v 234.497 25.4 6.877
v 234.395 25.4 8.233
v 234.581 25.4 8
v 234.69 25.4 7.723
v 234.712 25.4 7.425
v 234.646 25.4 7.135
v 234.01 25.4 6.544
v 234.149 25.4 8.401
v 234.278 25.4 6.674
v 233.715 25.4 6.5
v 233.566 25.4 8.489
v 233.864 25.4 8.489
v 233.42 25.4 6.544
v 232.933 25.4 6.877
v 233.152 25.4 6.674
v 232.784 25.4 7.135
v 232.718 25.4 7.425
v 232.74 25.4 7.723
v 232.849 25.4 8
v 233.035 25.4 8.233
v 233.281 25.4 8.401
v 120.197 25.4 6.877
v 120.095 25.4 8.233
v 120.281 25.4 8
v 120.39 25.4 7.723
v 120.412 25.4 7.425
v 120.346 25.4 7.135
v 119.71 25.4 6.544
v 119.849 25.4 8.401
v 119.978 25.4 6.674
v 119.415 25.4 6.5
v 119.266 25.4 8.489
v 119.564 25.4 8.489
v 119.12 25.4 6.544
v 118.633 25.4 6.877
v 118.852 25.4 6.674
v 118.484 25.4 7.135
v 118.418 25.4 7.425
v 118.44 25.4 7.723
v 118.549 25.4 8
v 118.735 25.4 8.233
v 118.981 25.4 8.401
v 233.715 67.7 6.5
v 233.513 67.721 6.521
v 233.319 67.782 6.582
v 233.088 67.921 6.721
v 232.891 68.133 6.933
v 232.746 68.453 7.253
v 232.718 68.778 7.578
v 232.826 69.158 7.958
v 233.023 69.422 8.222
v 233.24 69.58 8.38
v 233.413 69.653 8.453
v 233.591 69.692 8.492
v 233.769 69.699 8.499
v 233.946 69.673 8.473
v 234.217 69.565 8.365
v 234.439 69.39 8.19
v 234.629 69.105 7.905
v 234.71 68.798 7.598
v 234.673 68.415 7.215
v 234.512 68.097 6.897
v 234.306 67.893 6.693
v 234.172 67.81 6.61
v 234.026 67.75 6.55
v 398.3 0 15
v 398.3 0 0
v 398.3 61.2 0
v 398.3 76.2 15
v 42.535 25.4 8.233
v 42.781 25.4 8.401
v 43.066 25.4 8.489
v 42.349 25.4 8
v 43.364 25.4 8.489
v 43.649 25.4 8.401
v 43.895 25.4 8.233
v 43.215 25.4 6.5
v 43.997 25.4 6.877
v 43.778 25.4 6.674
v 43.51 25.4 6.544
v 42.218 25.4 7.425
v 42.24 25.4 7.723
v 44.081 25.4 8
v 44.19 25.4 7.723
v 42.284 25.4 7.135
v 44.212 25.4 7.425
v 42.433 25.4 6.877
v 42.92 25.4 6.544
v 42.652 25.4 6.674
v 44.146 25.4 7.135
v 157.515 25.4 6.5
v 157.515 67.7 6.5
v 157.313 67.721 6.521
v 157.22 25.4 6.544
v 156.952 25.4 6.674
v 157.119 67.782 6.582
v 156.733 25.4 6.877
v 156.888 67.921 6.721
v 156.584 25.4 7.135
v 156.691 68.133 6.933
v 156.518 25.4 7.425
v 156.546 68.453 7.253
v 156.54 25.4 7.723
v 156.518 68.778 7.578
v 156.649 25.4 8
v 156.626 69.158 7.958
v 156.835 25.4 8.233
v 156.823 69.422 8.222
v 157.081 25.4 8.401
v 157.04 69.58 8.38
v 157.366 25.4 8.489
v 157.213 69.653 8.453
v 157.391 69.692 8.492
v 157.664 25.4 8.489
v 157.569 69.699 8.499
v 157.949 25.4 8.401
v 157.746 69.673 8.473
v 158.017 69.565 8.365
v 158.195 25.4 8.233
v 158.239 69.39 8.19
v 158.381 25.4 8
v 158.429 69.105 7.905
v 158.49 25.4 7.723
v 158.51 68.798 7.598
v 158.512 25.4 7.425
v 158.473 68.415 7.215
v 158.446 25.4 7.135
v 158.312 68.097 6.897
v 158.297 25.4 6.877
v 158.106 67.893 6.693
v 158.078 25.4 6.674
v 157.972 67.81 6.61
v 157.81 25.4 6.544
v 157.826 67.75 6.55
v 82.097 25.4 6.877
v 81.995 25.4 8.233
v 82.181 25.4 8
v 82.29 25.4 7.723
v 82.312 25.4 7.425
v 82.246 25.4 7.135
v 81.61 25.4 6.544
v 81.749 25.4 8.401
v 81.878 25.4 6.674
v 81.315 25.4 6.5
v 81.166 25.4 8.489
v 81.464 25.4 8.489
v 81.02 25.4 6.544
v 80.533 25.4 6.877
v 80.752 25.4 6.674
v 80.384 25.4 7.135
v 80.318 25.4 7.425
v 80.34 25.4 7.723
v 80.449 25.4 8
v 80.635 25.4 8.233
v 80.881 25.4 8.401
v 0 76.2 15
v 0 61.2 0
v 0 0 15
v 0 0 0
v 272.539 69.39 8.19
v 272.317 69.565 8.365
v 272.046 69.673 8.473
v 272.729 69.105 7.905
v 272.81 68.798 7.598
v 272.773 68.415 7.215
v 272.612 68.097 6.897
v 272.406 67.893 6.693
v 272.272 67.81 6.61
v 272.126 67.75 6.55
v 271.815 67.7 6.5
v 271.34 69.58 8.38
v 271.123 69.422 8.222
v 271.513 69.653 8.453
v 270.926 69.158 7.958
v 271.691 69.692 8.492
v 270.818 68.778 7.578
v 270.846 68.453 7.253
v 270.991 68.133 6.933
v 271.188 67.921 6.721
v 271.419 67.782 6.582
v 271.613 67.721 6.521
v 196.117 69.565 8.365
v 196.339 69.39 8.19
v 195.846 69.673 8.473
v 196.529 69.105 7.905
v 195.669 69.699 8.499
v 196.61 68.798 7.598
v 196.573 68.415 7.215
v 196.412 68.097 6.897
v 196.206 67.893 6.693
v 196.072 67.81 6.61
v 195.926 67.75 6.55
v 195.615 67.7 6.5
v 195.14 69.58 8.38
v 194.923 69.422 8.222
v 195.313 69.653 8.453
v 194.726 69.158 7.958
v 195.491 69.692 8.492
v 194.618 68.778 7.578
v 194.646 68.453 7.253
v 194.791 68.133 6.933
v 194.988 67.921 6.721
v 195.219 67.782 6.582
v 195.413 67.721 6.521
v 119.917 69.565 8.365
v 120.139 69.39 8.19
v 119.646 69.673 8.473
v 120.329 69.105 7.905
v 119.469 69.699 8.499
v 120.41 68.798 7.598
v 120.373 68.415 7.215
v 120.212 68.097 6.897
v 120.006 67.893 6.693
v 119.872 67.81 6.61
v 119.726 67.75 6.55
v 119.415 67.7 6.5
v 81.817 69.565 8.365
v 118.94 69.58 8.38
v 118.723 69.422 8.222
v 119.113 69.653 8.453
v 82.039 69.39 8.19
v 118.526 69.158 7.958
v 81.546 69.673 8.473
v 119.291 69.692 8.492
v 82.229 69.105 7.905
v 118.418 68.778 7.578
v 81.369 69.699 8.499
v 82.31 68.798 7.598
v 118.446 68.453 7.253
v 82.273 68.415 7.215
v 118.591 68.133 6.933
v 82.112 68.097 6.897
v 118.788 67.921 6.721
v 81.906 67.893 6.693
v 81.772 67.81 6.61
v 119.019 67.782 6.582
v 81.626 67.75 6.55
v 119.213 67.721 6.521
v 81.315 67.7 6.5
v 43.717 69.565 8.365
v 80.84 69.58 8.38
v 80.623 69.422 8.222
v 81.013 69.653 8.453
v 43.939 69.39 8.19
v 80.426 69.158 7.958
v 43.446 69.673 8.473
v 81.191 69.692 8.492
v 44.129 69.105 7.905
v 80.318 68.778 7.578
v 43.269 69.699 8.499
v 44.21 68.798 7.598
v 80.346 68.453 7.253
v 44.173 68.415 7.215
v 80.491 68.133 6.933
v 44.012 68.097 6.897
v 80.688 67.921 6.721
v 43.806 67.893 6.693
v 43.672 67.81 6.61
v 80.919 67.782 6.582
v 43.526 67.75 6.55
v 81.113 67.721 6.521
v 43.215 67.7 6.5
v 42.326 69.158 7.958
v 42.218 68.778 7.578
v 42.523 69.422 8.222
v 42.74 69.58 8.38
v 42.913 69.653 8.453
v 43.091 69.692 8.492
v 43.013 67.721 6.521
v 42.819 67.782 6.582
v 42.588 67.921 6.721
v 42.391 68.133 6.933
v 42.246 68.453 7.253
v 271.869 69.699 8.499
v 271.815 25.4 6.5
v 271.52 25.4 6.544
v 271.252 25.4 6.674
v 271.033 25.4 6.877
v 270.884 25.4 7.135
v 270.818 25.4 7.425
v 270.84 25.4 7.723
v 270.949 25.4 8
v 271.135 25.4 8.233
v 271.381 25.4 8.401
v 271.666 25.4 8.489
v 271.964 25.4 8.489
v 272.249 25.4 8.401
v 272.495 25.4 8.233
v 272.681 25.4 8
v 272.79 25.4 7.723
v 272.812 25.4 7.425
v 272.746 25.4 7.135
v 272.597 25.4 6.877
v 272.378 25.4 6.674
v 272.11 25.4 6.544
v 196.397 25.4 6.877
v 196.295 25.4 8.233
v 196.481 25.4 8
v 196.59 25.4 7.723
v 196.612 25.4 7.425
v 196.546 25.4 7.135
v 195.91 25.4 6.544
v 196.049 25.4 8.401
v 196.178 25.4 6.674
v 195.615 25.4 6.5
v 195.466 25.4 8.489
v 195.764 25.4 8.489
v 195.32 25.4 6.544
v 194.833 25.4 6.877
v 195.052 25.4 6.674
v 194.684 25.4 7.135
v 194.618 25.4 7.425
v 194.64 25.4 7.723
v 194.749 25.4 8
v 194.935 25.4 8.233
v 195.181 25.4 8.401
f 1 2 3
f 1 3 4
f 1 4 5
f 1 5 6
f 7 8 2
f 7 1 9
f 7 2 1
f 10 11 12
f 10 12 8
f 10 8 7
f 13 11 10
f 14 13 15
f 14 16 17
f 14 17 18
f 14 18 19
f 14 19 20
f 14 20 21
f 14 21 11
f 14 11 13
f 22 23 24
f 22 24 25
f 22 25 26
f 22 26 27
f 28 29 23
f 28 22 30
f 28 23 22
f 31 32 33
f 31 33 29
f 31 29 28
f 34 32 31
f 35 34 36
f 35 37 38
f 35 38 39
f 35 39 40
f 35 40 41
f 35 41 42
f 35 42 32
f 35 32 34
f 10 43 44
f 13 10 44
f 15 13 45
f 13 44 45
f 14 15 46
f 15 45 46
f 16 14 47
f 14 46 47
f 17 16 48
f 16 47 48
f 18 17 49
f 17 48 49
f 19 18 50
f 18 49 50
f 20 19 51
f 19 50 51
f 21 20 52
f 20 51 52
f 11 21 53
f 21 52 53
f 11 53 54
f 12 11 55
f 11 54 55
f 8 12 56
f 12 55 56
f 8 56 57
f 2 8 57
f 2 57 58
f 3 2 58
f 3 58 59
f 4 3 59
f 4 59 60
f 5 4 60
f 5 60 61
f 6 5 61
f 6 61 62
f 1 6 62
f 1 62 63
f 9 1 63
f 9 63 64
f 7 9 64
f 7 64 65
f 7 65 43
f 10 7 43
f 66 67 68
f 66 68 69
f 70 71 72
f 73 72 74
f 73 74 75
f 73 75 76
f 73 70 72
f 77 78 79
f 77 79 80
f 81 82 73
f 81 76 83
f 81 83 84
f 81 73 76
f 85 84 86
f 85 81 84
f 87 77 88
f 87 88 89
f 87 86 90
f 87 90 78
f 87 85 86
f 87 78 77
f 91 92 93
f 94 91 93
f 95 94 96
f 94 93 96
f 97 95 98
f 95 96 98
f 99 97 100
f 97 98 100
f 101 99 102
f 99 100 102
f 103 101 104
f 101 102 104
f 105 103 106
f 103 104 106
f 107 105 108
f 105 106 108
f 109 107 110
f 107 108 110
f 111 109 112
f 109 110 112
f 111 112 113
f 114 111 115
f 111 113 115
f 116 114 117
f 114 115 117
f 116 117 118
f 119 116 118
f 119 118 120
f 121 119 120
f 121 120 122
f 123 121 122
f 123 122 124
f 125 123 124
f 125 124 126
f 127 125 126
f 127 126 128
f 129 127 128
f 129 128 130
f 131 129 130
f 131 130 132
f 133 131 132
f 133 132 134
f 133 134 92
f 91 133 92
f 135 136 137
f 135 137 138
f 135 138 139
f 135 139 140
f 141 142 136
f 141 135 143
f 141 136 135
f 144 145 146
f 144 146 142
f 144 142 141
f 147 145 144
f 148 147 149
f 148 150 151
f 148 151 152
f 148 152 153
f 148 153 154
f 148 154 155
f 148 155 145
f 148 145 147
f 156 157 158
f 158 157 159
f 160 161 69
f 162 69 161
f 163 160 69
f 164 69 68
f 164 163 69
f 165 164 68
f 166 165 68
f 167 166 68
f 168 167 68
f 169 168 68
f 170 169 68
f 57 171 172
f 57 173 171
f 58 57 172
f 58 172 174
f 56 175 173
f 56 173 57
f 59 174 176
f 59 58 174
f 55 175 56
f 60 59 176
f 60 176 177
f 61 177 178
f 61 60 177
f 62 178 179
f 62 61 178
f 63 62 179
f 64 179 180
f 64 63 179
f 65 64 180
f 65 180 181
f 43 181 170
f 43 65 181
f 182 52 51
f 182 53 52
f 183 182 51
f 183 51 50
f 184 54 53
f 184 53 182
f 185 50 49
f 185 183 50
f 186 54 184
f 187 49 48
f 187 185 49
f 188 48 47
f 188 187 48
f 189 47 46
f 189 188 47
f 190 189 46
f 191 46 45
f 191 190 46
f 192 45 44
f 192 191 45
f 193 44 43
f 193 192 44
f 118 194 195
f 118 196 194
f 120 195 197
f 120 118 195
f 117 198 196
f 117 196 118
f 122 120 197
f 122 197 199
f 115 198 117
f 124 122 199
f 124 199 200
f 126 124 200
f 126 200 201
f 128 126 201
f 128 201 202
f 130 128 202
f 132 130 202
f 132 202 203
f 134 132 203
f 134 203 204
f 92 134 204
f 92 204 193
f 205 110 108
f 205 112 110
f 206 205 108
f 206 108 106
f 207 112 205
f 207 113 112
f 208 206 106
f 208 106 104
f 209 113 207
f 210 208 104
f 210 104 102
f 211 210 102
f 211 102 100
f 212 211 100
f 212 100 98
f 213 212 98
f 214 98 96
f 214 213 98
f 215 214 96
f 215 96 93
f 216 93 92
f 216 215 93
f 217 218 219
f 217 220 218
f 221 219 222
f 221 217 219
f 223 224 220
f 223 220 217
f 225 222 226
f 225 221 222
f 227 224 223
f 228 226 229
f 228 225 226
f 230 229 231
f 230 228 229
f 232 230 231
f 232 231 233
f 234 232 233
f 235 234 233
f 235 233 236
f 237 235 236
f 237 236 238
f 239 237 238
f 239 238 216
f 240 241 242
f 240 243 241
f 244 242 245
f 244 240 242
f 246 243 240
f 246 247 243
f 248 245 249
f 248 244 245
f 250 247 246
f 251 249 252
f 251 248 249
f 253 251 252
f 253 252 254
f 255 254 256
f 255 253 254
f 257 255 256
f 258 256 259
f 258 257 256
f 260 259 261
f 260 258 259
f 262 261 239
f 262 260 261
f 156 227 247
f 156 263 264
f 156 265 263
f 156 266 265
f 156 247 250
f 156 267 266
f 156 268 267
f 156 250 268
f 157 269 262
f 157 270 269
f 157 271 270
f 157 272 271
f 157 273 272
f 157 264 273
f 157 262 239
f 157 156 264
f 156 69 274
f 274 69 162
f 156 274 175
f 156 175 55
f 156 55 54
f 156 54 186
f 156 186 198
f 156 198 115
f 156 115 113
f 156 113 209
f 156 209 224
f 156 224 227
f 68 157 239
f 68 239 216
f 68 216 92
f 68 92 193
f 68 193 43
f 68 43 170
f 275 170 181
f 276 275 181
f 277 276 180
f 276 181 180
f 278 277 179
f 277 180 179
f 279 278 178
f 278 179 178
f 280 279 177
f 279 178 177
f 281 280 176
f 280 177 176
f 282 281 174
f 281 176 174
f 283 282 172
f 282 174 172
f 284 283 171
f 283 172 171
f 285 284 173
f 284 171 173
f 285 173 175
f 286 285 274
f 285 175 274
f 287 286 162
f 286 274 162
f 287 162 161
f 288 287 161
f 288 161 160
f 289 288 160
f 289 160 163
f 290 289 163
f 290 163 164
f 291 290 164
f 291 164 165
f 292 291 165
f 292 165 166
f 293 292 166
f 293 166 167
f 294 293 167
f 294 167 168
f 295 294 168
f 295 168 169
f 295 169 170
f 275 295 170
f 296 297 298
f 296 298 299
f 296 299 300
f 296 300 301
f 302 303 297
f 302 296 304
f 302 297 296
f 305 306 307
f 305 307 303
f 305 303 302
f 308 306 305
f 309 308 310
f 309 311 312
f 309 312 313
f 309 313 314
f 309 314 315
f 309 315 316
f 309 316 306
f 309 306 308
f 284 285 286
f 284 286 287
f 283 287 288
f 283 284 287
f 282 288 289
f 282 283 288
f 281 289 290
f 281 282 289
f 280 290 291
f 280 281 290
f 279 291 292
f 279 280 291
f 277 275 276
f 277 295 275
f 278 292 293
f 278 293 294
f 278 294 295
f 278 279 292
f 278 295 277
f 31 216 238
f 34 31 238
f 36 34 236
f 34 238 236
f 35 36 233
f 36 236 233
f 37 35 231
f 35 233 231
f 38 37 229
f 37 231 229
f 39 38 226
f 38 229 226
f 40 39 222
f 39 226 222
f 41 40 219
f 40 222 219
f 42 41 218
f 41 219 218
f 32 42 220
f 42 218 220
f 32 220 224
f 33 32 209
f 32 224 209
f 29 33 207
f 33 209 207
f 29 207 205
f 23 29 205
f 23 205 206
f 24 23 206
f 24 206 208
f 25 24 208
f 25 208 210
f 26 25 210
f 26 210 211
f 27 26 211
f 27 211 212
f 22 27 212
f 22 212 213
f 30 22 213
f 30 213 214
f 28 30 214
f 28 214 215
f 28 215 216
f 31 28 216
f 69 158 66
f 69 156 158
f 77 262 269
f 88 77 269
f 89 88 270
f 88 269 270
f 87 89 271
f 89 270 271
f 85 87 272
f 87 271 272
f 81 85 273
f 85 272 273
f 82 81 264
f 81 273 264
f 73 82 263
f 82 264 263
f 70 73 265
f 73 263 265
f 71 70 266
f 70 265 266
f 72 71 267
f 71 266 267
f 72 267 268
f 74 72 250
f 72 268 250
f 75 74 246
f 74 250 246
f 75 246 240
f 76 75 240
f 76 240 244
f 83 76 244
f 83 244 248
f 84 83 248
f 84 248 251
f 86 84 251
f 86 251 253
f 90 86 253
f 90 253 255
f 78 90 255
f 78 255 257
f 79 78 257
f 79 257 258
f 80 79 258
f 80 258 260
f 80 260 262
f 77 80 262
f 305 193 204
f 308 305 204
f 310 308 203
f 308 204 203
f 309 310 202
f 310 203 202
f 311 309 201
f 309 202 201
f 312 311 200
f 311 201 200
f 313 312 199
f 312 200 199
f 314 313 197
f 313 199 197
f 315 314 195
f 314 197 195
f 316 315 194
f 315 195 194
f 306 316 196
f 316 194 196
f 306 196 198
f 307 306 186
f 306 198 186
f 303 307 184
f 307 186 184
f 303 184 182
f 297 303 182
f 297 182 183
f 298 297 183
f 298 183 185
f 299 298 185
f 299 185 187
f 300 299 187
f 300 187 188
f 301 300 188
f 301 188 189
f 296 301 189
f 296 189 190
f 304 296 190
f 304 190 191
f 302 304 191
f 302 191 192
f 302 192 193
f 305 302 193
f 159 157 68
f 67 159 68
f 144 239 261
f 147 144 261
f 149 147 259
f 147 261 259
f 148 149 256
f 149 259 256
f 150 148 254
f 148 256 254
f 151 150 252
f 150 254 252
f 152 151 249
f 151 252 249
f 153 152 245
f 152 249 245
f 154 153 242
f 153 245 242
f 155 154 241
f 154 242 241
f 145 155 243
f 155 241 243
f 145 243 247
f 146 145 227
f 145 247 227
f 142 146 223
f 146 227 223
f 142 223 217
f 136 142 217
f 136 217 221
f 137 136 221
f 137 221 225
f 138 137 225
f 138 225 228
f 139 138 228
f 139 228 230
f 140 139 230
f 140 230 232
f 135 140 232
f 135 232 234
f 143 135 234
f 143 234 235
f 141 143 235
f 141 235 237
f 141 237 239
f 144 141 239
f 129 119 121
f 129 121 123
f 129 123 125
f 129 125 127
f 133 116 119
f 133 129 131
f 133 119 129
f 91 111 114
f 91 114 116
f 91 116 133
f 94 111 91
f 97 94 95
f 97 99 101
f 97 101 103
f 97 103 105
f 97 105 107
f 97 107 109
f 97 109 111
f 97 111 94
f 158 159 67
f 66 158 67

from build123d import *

# Parameters (mm, degrees)
EXTRUDE_1_DEPTH     = 15
CUT_EXTRUDE_START   = 76.2
SKETCH_6_R          = 1
CUT_EXTRUDE_1_DEPTH = 50.8
CUT_EXTRUDE_2_DEPTH = 406.800850172


with BuildPart() as part:
    # 草图1 → 凸台-拉伸1 (new body)
    with BuildSketch(Plane.XY):
        Polygon((0, 0), (322.1, 0), (398.3, 0), (398.3, 76.2), (322.1, 76.2), (0, 76.2), align=None)
    extrude(amount=EXTRUDE_1_DEPTH)

    # 草图6 → 切除-拉伸1 (cut)
    with BuildSketch(Plane(origin=(0, 0, 0), x_dir=(1, 0, 0), z_dir=(0, 1, 0)).offset(CUT_EXTRUDE_START)):
        with Locations(Location((157.514854478, -7.5, 0), (0, 0, 90))):
            Circle(SKETCH_6_R)
        with Locations(Location((195.614854478, -7.5, 0), (0, 0, 90))):
            Circle(SKETCH_6_R)
        with Locations(Location((233.714854478, -7.5, 0), (0, 0, 90))):
            Circle(SKETCH_6_R)
        with Locations(Location((271.814854478, -7.5, 0), (0, 0, 90))):
            Circle(SKETCH_6_R)
        with Locations(Location((119.414854478, -7.5, 0), (0, 0, 90))):
            Circle(SKETCH_6_R)
        with Locations(Location((81.314854478, -7.5, 0), (0, 0, 90))):
            Circle(SKETCH_6_R)
        with Locations(Location((43.214854478, -7.5, 0), (0, 0, 90))):
            Circle(SKETCH_6_R)
    extrude(amount=-CUT_EXTRUDE_1_DEPTH, mode=Mode.SUBTRACT)

    # 草图3 → 切除-拉伸2 (cut, through all)
    with BuildSketch(Plane.ZY):
        Polygon((0, 76.2), (15, 76.2), (0, 61.2), align=None)
    extrude(amount=-CUT_EXTRUDE_2_DEPTH, mode=Mode.SUBTRACT)


solid = part.part
